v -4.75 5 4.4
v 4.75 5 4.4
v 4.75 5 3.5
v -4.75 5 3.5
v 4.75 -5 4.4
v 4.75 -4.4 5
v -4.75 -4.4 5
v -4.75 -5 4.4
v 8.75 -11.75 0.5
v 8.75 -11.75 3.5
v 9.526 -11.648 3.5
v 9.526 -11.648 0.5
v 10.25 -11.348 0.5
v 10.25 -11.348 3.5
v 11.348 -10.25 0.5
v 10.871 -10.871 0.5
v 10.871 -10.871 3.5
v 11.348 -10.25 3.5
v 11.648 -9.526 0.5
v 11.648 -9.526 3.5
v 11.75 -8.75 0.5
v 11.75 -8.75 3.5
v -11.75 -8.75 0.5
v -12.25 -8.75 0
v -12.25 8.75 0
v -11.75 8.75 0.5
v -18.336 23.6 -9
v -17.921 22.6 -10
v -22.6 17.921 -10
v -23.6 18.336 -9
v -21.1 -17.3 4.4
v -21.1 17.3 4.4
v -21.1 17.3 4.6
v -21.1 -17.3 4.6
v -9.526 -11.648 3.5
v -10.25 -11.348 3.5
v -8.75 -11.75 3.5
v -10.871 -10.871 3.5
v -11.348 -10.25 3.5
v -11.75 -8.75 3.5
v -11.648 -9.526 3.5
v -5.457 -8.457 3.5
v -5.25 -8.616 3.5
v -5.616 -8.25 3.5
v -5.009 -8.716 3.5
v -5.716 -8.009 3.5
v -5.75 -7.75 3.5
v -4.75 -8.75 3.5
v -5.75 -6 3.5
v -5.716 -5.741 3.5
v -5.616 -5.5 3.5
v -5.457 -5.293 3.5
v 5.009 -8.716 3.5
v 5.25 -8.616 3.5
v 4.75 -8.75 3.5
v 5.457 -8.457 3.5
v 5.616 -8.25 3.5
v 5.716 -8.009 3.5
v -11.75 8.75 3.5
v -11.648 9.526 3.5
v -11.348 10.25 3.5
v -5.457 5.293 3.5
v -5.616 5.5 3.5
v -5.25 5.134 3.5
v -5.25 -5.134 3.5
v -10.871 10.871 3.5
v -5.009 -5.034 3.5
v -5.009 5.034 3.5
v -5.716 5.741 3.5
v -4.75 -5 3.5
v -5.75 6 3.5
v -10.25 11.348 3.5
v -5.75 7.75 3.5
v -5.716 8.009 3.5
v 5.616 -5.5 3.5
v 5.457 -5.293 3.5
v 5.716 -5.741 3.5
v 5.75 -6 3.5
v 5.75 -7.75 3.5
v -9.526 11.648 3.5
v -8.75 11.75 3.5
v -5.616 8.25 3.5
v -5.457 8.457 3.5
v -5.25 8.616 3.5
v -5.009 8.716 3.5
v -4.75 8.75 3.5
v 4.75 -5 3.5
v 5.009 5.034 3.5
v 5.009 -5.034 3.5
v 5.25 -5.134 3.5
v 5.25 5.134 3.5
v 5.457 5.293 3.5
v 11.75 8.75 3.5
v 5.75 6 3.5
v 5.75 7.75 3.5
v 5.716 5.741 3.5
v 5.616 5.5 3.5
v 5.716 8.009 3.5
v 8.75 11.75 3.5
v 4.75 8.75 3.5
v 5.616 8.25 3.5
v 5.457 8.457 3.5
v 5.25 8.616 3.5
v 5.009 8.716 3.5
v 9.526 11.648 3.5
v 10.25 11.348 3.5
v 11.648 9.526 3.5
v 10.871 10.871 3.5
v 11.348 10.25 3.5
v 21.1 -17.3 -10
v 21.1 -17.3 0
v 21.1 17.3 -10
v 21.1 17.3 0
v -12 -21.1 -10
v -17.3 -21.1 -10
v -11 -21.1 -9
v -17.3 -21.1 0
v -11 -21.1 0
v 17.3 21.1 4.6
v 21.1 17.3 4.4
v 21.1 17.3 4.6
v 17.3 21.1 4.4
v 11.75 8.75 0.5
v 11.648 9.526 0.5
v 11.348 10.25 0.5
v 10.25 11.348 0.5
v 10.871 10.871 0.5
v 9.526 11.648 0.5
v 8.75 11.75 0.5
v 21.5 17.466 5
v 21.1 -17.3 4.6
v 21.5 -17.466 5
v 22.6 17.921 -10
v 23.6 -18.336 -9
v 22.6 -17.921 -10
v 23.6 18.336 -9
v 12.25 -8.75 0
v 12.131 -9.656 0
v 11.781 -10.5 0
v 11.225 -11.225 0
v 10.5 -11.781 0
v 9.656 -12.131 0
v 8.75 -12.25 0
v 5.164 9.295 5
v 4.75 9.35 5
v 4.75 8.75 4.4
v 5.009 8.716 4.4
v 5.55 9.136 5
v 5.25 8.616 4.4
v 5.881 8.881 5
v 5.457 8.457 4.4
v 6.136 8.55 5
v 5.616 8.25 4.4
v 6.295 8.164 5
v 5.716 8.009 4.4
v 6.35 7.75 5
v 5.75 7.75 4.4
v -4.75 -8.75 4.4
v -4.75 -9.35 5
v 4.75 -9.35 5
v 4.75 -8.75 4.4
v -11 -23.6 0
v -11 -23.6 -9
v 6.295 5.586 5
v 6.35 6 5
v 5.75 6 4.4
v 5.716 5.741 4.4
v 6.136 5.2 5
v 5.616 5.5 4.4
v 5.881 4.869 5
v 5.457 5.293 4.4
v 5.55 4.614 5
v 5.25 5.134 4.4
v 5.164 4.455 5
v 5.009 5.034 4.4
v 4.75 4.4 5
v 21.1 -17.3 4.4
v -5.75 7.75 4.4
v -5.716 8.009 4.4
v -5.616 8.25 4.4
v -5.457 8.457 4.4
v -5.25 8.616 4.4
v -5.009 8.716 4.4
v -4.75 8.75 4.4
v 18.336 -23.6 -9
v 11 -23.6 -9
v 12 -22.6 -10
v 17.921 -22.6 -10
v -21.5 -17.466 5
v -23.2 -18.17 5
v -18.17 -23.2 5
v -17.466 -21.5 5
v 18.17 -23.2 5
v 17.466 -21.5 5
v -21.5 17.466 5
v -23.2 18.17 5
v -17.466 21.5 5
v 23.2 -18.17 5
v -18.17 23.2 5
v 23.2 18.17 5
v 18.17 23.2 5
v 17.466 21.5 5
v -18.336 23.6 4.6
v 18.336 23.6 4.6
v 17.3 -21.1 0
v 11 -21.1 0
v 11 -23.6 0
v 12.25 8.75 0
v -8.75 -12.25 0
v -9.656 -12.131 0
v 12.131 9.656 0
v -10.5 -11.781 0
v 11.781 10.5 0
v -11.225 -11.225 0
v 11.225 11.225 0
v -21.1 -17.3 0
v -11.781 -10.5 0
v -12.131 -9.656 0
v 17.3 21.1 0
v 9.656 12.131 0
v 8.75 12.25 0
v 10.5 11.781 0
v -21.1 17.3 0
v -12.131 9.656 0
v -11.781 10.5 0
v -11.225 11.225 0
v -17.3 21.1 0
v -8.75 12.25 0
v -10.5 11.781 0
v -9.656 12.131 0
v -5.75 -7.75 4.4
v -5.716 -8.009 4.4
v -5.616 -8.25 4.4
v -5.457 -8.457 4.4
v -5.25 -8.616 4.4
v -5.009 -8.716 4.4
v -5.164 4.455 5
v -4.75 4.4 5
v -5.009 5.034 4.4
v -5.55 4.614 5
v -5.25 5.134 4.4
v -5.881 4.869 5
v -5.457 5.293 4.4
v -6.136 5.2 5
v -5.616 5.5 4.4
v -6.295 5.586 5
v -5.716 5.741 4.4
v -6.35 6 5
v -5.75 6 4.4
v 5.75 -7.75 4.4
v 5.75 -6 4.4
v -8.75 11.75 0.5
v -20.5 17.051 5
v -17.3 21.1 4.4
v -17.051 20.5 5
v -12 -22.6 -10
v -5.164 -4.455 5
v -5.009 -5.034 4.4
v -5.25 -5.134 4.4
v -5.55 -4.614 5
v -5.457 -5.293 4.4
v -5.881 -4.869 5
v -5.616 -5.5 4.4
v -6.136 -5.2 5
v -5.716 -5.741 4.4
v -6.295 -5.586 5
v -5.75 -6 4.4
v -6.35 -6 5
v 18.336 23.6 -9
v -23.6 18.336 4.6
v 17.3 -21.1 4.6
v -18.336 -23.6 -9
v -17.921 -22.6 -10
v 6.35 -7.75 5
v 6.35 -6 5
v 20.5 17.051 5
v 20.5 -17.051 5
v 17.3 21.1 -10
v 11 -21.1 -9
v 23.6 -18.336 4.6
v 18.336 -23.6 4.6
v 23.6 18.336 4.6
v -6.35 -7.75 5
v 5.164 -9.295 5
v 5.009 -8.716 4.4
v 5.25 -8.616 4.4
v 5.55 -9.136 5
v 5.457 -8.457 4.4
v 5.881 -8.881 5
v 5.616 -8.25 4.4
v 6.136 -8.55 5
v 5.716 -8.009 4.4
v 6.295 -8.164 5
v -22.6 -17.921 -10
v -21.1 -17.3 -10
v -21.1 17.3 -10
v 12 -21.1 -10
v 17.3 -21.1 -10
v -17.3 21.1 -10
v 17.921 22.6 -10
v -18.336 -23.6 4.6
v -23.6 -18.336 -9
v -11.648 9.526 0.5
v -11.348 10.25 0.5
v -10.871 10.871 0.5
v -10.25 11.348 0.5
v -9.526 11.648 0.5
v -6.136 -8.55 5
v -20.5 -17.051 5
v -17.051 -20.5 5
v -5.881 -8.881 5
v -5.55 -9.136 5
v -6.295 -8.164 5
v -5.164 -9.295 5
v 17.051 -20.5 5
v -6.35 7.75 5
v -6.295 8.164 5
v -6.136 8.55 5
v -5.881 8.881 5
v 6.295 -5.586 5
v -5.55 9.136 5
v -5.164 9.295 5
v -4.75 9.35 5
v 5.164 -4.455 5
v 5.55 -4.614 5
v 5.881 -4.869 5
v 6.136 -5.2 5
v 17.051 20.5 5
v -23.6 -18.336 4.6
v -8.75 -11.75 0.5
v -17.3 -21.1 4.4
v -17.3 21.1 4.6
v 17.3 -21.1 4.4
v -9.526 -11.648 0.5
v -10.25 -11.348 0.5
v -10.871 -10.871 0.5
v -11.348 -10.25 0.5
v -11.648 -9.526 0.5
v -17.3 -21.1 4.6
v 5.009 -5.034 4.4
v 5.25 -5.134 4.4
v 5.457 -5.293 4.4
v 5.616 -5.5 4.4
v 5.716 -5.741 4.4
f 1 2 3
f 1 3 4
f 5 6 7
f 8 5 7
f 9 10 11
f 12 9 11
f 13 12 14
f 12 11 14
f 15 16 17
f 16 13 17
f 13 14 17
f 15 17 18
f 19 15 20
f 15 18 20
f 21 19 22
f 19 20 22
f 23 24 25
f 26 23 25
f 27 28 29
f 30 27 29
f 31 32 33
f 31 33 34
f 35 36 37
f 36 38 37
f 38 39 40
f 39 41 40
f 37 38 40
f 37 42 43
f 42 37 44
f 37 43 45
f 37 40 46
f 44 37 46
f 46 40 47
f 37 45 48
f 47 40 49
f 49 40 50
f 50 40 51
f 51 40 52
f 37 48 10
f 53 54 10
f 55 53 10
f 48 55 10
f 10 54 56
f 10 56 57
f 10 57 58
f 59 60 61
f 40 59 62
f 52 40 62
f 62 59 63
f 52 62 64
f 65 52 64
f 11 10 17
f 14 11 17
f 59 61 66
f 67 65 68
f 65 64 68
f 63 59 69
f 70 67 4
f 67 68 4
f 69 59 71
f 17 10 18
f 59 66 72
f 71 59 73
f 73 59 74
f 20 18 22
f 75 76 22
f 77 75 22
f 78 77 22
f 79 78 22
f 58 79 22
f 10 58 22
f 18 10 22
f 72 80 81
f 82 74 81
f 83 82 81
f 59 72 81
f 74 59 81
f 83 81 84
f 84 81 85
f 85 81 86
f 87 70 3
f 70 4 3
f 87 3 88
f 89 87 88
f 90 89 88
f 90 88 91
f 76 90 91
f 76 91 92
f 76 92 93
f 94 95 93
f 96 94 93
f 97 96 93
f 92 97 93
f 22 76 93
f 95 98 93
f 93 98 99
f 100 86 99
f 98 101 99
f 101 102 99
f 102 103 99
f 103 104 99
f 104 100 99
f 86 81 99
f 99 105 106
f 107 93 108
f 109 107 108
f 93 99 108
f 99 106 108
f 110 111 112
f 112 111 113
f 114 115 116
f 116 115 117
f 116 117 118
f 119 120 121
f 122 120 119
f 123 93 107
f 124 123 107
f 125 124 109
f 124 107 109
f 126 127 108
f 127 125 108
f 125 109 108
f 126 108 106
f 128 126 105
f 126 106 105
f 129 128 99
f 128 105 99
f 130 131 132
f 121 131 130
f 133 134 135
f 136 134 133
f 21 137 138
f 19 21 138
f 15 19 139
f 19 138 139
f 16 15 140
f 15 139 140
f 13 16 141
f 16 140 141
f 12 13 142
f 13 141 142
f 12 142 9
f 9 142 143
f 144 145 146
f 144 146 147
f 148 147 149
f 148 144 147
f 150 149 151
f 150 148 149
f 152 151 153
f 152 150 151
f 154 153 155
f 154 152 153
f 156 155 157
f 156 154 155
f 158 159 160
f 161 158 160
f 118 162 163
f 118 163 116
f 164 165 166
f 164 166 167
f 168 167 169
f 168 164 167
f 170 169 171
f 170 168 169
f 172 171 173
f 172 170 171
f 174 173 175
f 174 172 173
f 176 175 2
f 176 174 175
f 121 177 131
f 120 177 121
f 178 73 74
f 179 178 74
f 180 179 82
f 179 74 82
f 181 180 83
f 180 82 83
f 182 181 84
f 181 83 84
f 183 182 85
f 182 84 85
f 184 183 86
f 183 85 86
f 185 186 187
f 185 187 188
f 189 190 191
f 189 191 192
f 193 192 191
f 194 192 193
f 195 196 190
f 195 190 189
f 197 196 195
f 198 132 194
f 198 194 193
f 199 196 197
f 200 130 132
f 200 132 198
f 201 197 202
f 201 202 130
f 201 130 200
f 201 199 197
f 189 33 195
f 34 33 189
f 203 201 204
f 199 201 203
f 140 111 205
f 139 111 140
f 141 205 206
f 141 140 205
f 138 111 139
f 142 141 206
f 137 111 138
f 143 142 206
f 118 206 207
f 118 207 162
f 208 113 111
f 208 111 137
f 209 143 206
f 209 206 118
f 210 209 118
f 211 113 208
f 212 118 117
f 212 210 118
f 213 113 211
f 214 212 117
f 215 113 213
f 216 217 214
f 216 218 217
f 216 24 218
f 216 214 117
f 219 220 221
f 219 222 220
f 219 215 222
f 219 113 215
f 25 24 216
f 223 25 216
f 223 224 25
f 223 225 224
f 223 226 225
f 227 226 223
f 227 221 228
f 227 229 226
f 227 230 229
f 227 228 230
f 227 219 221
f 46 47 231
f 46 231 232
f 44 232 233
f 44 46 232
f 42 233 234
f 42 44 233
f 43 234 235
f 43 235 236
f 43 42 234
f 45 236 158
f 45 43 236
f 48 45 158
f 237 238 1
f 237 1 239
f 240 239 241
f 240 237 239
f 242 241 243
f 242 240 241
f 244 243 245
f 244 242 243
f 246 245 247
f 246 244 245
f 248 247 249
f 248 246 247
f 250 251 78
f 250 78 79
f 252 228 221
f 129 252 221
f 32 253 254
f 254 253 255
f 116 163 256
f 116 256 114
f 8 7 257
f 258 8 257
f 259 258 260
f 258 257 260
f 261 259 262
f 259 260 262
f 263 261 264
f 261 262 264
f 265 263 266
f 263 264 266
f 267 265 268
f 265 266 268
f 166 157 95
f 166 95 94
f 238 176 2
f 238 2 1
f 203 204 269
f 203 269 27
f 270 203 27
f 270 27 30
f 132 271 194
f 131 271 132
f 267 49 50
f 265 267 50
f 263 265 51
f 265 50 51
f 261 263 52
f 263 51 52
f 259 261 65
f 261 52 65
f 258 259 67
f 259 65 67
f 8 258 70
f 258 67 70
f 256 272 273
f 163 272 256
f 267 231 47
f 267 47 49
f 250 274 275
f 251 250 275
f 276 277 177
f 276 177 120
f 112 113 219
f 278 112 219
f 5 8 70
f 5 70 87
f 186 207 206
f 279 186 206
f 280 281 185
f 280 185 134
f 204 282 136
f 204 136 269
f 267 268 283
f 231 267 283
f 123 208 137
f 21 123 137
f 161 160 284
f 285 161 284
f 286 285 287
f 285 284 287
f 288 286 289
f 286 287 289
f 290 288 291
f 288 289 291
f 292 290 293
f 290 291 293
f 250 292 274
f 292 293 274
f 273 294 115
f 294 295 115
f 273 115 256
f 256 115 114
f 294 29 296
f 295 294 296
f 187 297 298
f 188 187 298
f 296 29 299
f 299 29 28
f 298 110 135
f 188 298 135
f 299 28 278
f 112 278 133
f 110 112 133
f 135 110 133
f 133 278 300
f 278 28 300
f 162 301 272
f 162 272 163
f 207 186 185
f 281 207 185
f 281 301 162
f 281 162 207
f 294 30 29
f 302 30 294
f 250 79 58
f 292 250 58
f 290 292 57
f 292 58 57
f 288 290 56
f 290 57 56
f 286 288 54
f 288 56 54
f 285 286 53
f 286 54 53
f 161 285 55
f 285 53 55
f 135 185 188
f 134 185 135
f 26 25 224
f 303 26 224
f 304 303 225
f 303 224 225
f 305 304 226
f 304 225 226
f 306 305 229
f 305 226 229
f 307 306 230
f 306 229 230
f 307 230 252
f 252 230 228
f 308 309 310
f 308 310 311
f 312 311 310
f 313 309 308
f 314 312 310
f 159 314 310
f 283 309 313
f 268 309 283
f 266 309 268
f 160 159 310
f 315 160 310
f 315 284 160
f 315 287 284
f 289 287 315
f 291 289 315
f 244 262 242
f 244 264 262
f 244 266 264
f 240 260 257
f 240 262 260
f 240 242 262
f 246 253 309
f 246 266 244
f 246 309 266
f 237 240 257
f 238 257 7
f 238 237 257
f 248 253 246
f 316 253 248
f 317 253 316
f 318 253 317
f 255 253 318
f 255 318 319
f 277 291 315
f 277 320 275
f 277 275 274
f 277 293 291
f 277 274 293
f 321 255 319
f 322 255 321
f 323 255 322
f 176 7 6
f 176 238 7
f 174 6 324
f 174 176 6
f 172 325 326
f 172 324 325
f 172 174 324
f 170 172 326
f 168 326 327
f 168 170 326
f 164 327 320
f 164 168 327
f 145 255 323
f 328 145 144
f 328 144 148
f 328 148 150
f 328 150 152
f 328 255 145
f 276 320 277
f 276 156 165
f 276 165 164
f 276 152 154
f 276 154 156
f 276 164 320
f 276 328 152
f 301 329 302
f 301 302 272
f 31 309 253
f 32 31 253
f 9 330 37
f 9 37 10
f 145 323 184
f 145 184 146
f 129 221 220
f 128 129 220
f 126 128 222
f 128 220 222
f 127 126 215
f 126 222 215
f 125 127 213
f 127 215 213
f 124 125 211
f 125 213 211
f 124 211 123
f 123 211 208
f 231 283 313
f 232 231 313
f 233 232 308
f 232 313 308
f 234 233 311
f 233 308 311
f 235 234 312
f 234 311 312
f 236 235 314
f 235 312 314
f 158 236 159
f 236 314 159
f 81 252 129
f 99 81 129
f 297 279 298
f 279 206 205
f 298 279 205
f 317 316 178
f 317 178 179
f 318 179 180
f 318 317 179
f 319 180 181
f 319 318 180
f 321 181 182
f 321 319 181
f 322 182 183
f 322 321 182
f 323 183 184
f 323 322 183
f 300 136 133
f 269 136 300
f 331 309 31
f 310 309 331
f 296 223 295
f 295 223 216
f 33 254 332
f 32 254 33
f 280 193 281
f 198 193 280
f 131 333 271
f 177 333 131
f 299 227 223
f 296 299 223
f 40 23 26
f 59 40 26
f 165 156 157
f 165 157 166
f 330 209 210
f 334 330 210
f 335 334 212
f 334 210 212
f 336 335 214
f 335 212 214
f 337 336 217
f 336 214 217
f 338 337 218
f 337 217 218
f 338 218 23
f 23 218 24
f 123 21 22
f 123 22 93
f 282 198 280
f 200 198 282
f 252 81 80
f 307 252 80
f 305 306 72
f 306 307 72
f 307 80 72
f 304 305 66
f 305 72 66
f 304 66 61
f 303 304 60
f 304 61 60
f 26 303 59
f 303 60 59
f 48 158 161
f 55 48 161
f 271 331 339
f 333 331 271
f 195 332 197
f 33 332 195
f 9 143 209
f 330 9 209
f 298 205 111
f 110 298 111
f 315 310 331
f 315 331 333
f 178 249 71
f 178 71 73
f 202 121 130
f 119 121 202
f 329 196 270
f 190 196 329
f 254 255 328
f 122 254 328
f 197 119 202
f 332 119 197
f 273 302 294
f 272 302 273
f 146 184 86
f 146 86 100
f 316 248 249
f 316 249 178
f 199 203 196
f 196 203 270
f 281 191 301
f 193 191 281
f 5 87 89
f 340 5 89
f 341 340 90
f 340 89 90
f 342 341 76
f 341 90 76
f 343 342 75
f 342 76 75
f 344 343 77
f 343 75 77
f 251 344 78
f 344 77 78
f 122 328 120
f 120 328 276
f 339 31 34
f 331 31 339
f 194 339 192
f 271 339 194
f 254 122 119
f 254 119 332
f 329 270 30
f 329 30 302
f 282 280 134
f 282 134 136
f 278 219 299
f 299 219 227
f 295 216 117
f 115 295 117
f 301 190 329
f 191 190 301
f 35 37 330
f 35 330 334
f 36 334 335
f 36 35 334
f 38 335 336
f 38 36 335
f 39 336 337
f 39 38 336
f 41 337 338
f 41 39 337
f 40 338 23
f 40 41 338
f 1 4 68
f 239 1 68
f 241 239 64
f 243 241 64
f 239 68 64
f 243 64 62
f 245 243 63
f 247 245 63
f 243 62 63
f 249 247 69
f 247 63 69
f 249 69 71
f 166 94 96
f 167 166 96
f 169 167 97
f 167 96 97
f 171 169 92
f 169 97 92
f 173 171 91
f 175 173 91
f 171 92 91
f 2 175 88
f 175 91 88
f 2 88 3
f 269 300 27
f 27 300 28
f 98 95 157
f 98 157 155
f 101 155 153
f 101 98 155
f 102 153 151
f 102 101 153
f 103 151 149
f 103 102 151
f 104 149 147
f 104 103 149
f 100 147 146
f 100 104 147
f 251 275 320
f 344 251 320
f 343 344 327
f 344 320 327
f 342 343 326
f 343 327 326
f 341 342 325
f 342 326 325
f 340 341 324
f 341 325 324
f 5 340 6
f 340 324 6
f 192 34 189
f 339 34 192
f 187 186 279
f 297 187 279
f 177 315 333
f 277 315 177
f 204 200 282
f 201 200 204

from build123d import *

# Parameters (mm, degrees)
SKETCH1_W                = 42.2
SKETCH1_H                = 42.2
SKETCH1_W_2              = 23.5
SKETCH1_H_2              = 23.5
BOSS_EXTRUDE1_DEPTH      = 5
SKETCH3_W                = 11.5
SKETCH3_H                = 3
BOSS_EXTRUDE3_DEPTH      = 1.5
CHAMFER1_SIZE            = 3.8
FILLET1_R                = 3
FILLET2_R                = 1
CHAMFER3_SIZE            = 0.5
CHAMFER4_SIZE            = 0.6
BOSS_EXTRUDE5_DEPTH      = 5
BOSS_EXTRUDE5_DEPTH_BACK = 10
CHAMFER5_SIZE            = 0.4
CUT_EXTRUDE4_START       = -10
SKETCH8_W                = 22
SKETCH8_H                = 2.5
CUT_EXTRUDE4_DEPTH       = 10
CHAMFER6_SIZE            = 1


with BuildPart() as part:
    # Sketch1 → Boss-Extrude1 (new body)
    with BuildSketch(Plane.XY):
        Rectangle(SKETCH1_W, SKETCH1_H)
        Rectangle(SKETCH1_W_2, SKETCH1_H_2, mode=Mode.SUBTRACT)
    extrude(amount=BOSS_EXTRUDE1_DEPTH)

    # Sketch3 → Boss-Extrude3 (add)
    with BuildSketch(Plane.XY.offset(5)):
        Polygon((11.75, 11.75), (5.75, 11.75), (5.75, 8.75), (5.75, 5), (-5.75, 5), (-5.75, 8.75), (-5.75, 11.75), (-11.75, 11.75), (-11.75, -11.75), (-5.75, -11.75), (-5.75, -8.75), (-5.75, -5), (5.75, -5), (5.75, -8.75), (5.75, -11.75), (11.75, -11.75), align=None)
        with Locations((0, 10.25)):
            Rectangle(SKETCH3_W, SKETCH3_H)
        with Locations((0, -10.25)):
            Rectangle(SKETCH3_W, SKETCH3_H)
    extrude(amount=-BOSS_EXTRUDE3_DEPTH)

    # Chamfer1
    chamfer1_edges = [part.edges().sort_by_distance(p)[0] for p in [
        (21.1, -21.1, 2.5),
        (-21.1, -21.1, 2.5),
        (-21.1, 21.1, 2.5),
        (21.1, 21.1, 2.5),
    ]]
    chamfer(chamfer1_edges, length=CHAMFER1_SIZE)

    # Fillet1
    fillet1_edges = [part.edges().sort_by_distance(p)[0] for p in [
        (-11.75, -11.75, 1.75),
        (11.75, -11.75, 1.75),
        (-11.75, 11.75, 1.75),
        (11.75, 11.75, 1.75),
    ]]
    fillet(fillet1_edges, radius=FILLET1_R)

    # Fillet2
    fillet2_edges = [part.edges().sort_by_distance(p)[0] for p in [
        (5.75, 8.75, 4.25),
        (-5.75, 8.75, 4.25),
        (-5.75, 5, 4.25),
        (5.75, -8.75, 4.25),
        (5.75, -5, 4.25),
        (-5.75, -5, 4.25),
        (5.75, 5, 4.25),
        (-5.75, -8.75, 4.25),
    ]]
    fillet(fillet2_edges, radius=FILLET2_R)

    # Chamfer3
    chamfer3_edges = [part.edges().sort_by_distance(p)[0] for p in [
        (-10.871320344, -10.871320344, 0),
        (-10.871320344, 10.871320344, 0),
        (10.871320344, -10.871320344, 0),
        (10.871320344, 10.871320344, 0),
        (-11.75, 0, 0),
        (0, -11.75, 0),
        (0, 11.75, 0),
        (11.75, 0, 0),
    ]]
    chamfer(chamfer3_edges, length=CHAMFER3_SIZE)

    # Chamfer4
    chamfer4_edges = [part.edges().sort_by_distance(p)[0] for p in [
        (0, -8.75, 5),
        (-5.75, -6.875, 5),
        (0, -5, 5),
        (5.75, -6.875, 5),
        (5.75, 6.875, 5),
        (0, 5, 5),
        (-5.75, 6.875, 5),
        (0, 8.75, 5),
        (-5.457106781, -8.457106781, 5),
        (-5.457106781, -5.292893219, 5),
        (5.457106781, -5.292893219, 5),
        (5.457106781, -8.457106781, 5),
        (5.457106781, 5.292893219, 5),
        (-5.457106781, 5.292893219, 5),
        (-5.457106781, 8.457106781, 5),
        (5.457106781, 8.457106781, 5),
        (0, 21.1, 5),
        (21.1, 0, 5),
        (-21.1, 0, 5),
        (0, -21.1, 5),
        (-19.2, -19.2, 5),
        (-19.2, 19.2, 5),
        (19.2, -19.2, 5),
        (19.2, 19.2, 5),
    ]]
    chamfer(chamfer4_edges, length=CHAMFER4_SIZE)

    # Sketch7 → Boss-Extrude5 (add, two sides)
    with BuildSketch(Plane.XY) as boss_extrude5_sk:
        Polygon((18.335533906, 23.6), (-18.335533906, 23.6), (-23.6, 18.335533906), (-23.6, -18.335533906), (-18.335533906, -23.6), (18.335533906, -23.6), (23.6, -18.335533906), (23.6, 18.335533906), align=None)
        Polygon((17.3, 21.1), (-17.3, 21.1), (-21.1, 17.3), (-21.1, -17.3), (-17.3, -21.1), (17.3, -21.1), (21.1, -17.3), (21.1, 17.3), align=None, mode=Mode.SUBTRACT)
    extrude(amount=BOSS_EXTRUDE5_DEPTH)
    extrude(boss_extrude5_sk.sketch, amount=-BOSS_EXTRUDE5_DEPTH_BACK)

    # Chamfer5
    chamfer5_edges = [part.edges().sort_by_distance(p)[0] for p in [
        (20.967766953, 20.967766953, 5),
        (0, 23.6, 5),
        (-20.967766953, 20.967766953, 5),
        (-23.6, 0, 5),
        (-20.967766953, -20.967766953, 5),
        (0, -23.6, 5),
        (20.967766953, -20.967766953, 5),
        (23.6, 0, 5),
        (-19.2, 19.2, 5),
        (-21.1, 0, 5),
        (-19.2, -19.2, 5),
        (0, -21.1, 5),
        (19.2, -19.2, 5),
        (21.1, 0, 5),
        (19.2, 19.2, 5),
        (0, 21.1, 5),
    ]]
    chamfer(chamfer5_edges, length=CHAMFER5_SIZE)

    # Sketch8 → Cut-Extrude4 (cut)
    with BuildSketch(Plane(origin=(0, 0, -10), x_dir=(-1, 0, 0), z_dir=(0, 0, -1)).offset(CUT_EXTRUDE4_START)):
        with Locations((0, -22.35)):
            Rectangle(SKETCH8_W, SKETCH8_H)
    extrude(amount=CUT_EXTRUDE4_DEPTH, mode=Mode.SUBTRACT)

    # Chamfer6
    chamfer6_edges = [part.edges().sort_by_distance(p)[0] for p in [
        (20.967766953, 20.967766953, -10),
        (0, 23.6, -10),
        (-20.967766953, 20.967766953, -10),
        (-23.6, 0, -10),
        (-20.967766953, -20.967766953, -10),
        (-14.667766953, -23.6, -10),
        (20.967766953, -20.967766953, -10),
        (23.6, 0, -10),
        (14.667766953, -23.6, -10),
        (11, -22.35, -10),
        (-11, -22.35, -10),
    ]]
    chamfer(chamfer6_edges, length=CHAMFER6_SIZE)


solid = part.part
